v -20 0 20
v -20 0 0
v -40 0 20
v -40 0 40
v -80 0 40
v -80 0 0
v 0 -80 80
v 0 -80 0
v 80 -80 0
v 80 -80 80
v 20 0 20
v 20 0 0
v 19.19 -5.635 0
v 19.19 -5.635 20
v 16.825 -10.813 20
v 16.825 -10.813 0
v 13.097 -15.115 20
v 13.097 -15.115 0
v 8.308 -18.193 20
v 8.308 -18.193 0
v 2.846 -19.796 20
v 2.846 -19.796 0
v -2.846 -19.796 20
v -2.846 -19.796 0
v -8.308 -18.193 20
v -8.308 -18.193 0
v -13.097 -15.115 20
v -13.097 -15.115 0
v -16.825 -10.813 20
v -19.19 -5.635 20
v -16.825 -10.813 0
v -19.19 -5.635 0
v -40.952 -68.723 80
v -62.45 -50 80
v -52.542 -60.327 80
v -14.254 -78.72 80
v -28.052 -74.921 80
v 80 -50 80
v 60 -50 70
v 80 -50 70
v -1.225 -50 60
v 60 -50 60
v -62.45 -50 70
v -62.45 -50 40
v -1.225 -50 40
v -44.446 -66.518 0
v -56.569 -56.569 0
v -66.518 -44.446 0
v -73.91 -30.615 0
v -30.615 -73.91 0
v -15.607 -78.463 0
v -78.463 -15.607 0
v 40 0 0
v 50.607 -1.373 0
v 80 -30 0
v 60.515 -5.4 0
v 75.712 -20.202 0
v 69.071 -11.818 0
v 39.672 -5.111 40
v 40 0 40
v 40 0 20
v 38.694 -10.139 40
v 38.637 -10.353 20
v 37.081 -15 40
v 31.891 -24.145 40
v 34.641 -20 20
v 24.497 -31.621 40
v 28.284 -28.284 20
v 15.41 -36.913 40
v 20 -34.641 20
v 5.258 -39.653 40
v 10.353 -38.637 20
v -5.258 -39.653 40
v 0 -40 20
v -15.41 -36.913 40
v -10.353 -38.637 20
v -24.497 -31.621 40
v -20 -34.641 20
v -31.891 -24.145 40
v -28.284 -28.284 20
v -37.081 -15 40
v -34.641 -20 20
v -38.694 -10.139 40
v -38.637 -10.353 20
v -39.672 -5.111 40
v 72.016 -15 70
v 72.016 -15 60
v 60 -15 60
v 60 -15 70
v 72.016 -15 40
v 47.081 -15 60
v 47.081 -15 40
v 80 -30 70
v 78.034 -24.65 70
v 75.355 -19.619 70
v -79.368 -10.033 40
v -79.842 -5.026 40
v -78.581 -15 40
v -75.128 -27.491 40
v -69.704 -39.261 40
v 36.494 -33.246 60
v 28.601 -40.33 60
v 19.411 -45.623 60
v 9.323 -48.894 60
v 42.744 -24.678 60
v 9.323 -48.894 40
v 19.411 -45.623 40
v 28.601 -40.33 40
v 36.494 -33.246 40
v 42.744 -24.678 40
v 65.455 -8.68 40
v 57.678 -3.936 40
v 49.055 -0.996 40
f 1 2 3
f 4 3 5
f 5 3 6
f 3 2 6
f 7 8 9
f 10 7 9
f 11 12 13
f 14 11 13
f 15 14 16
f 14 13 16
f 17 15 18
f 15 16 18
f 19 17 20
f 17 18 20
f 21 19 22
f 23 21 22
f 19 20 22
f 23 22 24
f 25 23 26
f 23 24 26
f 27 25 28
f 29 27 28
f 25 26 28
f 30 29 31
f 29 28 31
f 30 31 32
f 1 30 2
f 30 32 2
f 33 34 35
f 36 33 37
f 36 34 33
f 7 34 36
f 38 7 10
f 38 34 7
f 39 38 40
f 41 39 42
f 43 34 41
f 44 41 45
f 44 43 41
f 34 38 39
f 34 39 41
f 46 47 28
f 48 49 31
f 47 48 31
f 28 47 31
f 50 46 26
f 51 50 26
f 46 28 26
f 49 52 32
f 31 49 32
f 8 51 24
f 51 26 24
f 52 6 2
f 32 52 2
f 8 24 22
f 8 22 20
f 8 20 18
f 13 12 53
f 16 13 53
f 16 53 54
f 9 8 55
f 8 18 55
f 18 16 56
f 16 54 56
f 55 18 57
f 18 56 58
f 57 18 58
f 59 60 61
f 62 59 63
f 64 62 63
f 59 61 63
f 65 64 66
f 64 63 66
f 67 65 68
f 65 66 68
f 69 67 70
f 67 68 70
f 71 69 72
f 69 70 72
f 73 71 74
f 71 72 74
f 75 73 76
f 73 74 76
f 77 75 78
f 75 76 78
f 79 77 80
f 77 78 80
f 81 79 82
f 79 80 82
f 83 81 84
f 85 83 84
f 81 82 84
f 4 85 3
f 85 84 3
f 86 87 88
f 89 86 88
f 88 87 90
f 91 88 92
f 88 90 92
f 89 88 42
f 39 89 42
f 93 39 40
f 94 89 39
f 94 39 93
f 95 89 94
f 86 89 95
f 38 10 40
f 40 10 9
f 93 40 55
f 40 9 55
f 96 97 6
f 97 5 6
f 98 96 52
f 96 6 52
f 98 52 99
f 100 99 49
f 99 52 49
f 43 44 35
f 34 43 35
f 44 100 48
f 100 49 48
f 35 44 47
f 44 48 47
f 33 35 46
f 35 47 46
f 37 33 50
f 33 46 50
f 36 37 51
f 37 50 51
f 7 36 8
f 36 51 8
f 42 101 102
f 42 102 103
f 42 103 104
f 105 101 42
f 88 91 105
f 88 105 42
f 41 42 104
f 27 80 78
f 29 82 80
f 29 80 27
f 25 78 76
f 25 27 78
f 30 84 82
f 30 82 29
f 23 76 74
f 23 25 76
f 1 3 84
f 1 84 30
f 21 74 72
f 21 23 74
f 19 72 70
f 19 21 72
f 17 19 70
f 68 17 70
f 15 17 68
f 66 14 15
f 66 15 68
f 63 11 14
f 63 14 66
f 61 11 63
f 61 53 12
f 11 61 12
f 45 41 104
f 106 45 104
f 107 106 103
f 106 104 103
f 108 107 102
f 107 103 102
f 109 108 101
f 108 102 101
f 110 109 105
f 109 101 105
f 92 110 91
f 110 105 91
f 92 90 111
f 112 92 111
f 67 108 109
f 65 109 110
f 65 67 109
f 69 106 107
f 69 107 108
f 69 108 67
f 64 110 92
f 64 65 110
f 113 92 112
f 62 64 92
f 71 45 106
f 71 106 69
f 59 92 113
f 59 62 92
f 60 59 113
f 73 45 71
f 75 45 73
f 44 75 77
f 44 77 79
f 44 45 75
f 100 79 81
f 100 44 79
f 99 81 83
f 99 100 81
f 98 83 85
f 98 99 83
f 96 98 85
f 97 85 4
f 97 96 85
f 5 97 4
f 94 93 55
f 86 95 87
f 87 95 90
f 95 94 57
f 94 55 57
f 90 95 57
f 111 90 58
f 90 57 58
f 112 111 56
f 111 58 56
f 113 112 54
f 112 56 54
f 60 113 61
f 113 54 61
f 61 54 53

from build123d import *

# Parameters (mm, degrees)
BOSS_EXTRUDE5_DEPTH = 80
BOSS_EXTRUDE6_DEPTH = 20
SKETCH6_W           = 10
SKETCH6_H           = 50
CUT_EXTRUDE5_DEPTH  = 222
SKETCH7_W           = 30
SKETCH7_H           = 15
CUT_EXTRUDE6_DEPTH  = 222
CUT_EXTRUDE7_DEPTH  = 10
CUT_EXTRUDE8_DEPTH  = 10
BOSS_EXTRUDE9_DEPTH = 10
CUT_EXTRUDE14_DEPTH = 30


with BuildPart() as part:
    # Sketch1 → Boss-Extrude5 (new body)
    with BuildSketch(Plane.XY):
        with BuildLine():
            Line((80, -80), (80, -30))
            ThreePointArc((80, -30), (65, -8.333333333), (40, 0))
            ThreePointArc((40, 0), (0, -40), (-40, 0))
            Line((-40, 0), (-80, 0))
            ThreePointArc((-80, 0), (-56.568542495, -56.568542495), (0, -80))
            Line((0, -80), (80, -80))
        make_face()
    extrude(amount=BOSS_EXTRUDE5_DEPTH)

    # Sketch4 → Boss-Extrude6 (add)
    with BuildSketch(Plane(origin=(0, 0, 0), x_dir=(-1, 0, 0), z_dir=(0, 0, -1))):
        with BuildLine():
            Line((20, 0), (40, 0))
            ThreePointArc((40, 0), (0, -40), (-40, 0))
            Line((-40, 0), (-20, 0))
            ThreePointArc((-20, 0), (0, -20), (20, 0))
        make_face()
    extrude(amount=-BOSS_EXTRUDE6_DEPTH)

    # Sketch6 → Cut-Extrude5 (cut)
    with BuildSketch(Plane(origin=(-80, 0, 0), x_dir=(0, 0, -1), z_dir=(1, 0, 0))):
        with Locations((-75, -25)):
            Rectangle(SKETCH6_W, SKETCH6_H)
    extrude(amount=CUT_EXTRUDE5_DEPTH, mode=Mode.SUBTRACT)

    # Sketch7 → Cut-Extrude6 (cut)
    with BuildSketch(Plane(origin=(-80, 0, 0), x_dir=(0, 0, -1), z_dir=(1, 0, 0))):
        with Locations((-55, -7.5)):
            Rectangle(SKETCH7_W, SKETCH7_H)
    extrude(amount=CUT_EXTRUDE6_DEPTH, mode=Mode.SUBTRACT)

    # Sketch9 → Cut-Extrude7 (cut)
    with BuildSketch(Plane.XY.offset(70)):
        with BuildLine():
            Line((72.015621187, -15), (60, -15))
            Line((60, -15), (60, -50))
            Line((60, -50), (80, -50))
            Line((80, -50), (80, -30))
            ThreePointArc((80, -30), (76.780598469, -22.088651257), (72.015621187, -15))
        make_face()
    extrude(amount=-CUT_EXTRUDE7_DEPTH, mode=Mode.SUBTRACT)

    # Sketch10 → Cut-Extrude8 (cut)
    with BuildSketch(Plane.XY.offset(70)):
        with BuildLine():
            Line((60, -50), (60, -15))
            Line((60, -15), (47.080992435, -15))
            ThreePointArc((47.080992435, -15), (28.601457744, -40.330339745), (-1.224989992, -50))
            Line((-1.224989992, -50), (60, -50))
        make_face()
    extrude(amount=-CUT_EXTRUDE8_DEPTH, mode=Mode.SUBTRACT)

    # Sketch11 → Boss-Extrude9 (add)
    with BuildSketch(Plane.XY.offset(60)):
        with BuildLine():
            Line((60, -50), (80, -50))
            Line((80, -50), (80, -30))
            ThreePointArc((80, -30), (76.780598469, -22.088651257), (72.015621187, -15))
            Line((72.015621187, -15), (70, -15))
            Line((70, -15), (60, -15))
            Line((60, -15), (60, -50))
        make_face()
    extrude(amount=BOSS_EXTRUDE9_DEPTH)

    # Sketch15 → Cut-Extrude14 (cut)
    with BuildSketch(Plane.XY.offset(70)):
        with BuildLine():
            Line((47.080992435, -15), (37.080992435, -15))
            ThreePointArc((37.080992435, -15), (0, -40), (-37.080992435, -15))
            Line((-37.080992435, -15), (-78.581168228, -15))
            ThreePointArc((-78.581168228, -15), (-72.654636407, -33.485874761), (-62.449979984, -50))
            Line((-62.449979984, -50), (-1.224989992, -50))
            ThreePointArc((-1.224989992, -50), (28.601457744, -40.330339745), (47.080992435, -15))
        make_face()
    extrude(amount=-CUT_EXTRUDE14_DEPTH, mode=Mode.SUBTRACT)


solid = part.part
